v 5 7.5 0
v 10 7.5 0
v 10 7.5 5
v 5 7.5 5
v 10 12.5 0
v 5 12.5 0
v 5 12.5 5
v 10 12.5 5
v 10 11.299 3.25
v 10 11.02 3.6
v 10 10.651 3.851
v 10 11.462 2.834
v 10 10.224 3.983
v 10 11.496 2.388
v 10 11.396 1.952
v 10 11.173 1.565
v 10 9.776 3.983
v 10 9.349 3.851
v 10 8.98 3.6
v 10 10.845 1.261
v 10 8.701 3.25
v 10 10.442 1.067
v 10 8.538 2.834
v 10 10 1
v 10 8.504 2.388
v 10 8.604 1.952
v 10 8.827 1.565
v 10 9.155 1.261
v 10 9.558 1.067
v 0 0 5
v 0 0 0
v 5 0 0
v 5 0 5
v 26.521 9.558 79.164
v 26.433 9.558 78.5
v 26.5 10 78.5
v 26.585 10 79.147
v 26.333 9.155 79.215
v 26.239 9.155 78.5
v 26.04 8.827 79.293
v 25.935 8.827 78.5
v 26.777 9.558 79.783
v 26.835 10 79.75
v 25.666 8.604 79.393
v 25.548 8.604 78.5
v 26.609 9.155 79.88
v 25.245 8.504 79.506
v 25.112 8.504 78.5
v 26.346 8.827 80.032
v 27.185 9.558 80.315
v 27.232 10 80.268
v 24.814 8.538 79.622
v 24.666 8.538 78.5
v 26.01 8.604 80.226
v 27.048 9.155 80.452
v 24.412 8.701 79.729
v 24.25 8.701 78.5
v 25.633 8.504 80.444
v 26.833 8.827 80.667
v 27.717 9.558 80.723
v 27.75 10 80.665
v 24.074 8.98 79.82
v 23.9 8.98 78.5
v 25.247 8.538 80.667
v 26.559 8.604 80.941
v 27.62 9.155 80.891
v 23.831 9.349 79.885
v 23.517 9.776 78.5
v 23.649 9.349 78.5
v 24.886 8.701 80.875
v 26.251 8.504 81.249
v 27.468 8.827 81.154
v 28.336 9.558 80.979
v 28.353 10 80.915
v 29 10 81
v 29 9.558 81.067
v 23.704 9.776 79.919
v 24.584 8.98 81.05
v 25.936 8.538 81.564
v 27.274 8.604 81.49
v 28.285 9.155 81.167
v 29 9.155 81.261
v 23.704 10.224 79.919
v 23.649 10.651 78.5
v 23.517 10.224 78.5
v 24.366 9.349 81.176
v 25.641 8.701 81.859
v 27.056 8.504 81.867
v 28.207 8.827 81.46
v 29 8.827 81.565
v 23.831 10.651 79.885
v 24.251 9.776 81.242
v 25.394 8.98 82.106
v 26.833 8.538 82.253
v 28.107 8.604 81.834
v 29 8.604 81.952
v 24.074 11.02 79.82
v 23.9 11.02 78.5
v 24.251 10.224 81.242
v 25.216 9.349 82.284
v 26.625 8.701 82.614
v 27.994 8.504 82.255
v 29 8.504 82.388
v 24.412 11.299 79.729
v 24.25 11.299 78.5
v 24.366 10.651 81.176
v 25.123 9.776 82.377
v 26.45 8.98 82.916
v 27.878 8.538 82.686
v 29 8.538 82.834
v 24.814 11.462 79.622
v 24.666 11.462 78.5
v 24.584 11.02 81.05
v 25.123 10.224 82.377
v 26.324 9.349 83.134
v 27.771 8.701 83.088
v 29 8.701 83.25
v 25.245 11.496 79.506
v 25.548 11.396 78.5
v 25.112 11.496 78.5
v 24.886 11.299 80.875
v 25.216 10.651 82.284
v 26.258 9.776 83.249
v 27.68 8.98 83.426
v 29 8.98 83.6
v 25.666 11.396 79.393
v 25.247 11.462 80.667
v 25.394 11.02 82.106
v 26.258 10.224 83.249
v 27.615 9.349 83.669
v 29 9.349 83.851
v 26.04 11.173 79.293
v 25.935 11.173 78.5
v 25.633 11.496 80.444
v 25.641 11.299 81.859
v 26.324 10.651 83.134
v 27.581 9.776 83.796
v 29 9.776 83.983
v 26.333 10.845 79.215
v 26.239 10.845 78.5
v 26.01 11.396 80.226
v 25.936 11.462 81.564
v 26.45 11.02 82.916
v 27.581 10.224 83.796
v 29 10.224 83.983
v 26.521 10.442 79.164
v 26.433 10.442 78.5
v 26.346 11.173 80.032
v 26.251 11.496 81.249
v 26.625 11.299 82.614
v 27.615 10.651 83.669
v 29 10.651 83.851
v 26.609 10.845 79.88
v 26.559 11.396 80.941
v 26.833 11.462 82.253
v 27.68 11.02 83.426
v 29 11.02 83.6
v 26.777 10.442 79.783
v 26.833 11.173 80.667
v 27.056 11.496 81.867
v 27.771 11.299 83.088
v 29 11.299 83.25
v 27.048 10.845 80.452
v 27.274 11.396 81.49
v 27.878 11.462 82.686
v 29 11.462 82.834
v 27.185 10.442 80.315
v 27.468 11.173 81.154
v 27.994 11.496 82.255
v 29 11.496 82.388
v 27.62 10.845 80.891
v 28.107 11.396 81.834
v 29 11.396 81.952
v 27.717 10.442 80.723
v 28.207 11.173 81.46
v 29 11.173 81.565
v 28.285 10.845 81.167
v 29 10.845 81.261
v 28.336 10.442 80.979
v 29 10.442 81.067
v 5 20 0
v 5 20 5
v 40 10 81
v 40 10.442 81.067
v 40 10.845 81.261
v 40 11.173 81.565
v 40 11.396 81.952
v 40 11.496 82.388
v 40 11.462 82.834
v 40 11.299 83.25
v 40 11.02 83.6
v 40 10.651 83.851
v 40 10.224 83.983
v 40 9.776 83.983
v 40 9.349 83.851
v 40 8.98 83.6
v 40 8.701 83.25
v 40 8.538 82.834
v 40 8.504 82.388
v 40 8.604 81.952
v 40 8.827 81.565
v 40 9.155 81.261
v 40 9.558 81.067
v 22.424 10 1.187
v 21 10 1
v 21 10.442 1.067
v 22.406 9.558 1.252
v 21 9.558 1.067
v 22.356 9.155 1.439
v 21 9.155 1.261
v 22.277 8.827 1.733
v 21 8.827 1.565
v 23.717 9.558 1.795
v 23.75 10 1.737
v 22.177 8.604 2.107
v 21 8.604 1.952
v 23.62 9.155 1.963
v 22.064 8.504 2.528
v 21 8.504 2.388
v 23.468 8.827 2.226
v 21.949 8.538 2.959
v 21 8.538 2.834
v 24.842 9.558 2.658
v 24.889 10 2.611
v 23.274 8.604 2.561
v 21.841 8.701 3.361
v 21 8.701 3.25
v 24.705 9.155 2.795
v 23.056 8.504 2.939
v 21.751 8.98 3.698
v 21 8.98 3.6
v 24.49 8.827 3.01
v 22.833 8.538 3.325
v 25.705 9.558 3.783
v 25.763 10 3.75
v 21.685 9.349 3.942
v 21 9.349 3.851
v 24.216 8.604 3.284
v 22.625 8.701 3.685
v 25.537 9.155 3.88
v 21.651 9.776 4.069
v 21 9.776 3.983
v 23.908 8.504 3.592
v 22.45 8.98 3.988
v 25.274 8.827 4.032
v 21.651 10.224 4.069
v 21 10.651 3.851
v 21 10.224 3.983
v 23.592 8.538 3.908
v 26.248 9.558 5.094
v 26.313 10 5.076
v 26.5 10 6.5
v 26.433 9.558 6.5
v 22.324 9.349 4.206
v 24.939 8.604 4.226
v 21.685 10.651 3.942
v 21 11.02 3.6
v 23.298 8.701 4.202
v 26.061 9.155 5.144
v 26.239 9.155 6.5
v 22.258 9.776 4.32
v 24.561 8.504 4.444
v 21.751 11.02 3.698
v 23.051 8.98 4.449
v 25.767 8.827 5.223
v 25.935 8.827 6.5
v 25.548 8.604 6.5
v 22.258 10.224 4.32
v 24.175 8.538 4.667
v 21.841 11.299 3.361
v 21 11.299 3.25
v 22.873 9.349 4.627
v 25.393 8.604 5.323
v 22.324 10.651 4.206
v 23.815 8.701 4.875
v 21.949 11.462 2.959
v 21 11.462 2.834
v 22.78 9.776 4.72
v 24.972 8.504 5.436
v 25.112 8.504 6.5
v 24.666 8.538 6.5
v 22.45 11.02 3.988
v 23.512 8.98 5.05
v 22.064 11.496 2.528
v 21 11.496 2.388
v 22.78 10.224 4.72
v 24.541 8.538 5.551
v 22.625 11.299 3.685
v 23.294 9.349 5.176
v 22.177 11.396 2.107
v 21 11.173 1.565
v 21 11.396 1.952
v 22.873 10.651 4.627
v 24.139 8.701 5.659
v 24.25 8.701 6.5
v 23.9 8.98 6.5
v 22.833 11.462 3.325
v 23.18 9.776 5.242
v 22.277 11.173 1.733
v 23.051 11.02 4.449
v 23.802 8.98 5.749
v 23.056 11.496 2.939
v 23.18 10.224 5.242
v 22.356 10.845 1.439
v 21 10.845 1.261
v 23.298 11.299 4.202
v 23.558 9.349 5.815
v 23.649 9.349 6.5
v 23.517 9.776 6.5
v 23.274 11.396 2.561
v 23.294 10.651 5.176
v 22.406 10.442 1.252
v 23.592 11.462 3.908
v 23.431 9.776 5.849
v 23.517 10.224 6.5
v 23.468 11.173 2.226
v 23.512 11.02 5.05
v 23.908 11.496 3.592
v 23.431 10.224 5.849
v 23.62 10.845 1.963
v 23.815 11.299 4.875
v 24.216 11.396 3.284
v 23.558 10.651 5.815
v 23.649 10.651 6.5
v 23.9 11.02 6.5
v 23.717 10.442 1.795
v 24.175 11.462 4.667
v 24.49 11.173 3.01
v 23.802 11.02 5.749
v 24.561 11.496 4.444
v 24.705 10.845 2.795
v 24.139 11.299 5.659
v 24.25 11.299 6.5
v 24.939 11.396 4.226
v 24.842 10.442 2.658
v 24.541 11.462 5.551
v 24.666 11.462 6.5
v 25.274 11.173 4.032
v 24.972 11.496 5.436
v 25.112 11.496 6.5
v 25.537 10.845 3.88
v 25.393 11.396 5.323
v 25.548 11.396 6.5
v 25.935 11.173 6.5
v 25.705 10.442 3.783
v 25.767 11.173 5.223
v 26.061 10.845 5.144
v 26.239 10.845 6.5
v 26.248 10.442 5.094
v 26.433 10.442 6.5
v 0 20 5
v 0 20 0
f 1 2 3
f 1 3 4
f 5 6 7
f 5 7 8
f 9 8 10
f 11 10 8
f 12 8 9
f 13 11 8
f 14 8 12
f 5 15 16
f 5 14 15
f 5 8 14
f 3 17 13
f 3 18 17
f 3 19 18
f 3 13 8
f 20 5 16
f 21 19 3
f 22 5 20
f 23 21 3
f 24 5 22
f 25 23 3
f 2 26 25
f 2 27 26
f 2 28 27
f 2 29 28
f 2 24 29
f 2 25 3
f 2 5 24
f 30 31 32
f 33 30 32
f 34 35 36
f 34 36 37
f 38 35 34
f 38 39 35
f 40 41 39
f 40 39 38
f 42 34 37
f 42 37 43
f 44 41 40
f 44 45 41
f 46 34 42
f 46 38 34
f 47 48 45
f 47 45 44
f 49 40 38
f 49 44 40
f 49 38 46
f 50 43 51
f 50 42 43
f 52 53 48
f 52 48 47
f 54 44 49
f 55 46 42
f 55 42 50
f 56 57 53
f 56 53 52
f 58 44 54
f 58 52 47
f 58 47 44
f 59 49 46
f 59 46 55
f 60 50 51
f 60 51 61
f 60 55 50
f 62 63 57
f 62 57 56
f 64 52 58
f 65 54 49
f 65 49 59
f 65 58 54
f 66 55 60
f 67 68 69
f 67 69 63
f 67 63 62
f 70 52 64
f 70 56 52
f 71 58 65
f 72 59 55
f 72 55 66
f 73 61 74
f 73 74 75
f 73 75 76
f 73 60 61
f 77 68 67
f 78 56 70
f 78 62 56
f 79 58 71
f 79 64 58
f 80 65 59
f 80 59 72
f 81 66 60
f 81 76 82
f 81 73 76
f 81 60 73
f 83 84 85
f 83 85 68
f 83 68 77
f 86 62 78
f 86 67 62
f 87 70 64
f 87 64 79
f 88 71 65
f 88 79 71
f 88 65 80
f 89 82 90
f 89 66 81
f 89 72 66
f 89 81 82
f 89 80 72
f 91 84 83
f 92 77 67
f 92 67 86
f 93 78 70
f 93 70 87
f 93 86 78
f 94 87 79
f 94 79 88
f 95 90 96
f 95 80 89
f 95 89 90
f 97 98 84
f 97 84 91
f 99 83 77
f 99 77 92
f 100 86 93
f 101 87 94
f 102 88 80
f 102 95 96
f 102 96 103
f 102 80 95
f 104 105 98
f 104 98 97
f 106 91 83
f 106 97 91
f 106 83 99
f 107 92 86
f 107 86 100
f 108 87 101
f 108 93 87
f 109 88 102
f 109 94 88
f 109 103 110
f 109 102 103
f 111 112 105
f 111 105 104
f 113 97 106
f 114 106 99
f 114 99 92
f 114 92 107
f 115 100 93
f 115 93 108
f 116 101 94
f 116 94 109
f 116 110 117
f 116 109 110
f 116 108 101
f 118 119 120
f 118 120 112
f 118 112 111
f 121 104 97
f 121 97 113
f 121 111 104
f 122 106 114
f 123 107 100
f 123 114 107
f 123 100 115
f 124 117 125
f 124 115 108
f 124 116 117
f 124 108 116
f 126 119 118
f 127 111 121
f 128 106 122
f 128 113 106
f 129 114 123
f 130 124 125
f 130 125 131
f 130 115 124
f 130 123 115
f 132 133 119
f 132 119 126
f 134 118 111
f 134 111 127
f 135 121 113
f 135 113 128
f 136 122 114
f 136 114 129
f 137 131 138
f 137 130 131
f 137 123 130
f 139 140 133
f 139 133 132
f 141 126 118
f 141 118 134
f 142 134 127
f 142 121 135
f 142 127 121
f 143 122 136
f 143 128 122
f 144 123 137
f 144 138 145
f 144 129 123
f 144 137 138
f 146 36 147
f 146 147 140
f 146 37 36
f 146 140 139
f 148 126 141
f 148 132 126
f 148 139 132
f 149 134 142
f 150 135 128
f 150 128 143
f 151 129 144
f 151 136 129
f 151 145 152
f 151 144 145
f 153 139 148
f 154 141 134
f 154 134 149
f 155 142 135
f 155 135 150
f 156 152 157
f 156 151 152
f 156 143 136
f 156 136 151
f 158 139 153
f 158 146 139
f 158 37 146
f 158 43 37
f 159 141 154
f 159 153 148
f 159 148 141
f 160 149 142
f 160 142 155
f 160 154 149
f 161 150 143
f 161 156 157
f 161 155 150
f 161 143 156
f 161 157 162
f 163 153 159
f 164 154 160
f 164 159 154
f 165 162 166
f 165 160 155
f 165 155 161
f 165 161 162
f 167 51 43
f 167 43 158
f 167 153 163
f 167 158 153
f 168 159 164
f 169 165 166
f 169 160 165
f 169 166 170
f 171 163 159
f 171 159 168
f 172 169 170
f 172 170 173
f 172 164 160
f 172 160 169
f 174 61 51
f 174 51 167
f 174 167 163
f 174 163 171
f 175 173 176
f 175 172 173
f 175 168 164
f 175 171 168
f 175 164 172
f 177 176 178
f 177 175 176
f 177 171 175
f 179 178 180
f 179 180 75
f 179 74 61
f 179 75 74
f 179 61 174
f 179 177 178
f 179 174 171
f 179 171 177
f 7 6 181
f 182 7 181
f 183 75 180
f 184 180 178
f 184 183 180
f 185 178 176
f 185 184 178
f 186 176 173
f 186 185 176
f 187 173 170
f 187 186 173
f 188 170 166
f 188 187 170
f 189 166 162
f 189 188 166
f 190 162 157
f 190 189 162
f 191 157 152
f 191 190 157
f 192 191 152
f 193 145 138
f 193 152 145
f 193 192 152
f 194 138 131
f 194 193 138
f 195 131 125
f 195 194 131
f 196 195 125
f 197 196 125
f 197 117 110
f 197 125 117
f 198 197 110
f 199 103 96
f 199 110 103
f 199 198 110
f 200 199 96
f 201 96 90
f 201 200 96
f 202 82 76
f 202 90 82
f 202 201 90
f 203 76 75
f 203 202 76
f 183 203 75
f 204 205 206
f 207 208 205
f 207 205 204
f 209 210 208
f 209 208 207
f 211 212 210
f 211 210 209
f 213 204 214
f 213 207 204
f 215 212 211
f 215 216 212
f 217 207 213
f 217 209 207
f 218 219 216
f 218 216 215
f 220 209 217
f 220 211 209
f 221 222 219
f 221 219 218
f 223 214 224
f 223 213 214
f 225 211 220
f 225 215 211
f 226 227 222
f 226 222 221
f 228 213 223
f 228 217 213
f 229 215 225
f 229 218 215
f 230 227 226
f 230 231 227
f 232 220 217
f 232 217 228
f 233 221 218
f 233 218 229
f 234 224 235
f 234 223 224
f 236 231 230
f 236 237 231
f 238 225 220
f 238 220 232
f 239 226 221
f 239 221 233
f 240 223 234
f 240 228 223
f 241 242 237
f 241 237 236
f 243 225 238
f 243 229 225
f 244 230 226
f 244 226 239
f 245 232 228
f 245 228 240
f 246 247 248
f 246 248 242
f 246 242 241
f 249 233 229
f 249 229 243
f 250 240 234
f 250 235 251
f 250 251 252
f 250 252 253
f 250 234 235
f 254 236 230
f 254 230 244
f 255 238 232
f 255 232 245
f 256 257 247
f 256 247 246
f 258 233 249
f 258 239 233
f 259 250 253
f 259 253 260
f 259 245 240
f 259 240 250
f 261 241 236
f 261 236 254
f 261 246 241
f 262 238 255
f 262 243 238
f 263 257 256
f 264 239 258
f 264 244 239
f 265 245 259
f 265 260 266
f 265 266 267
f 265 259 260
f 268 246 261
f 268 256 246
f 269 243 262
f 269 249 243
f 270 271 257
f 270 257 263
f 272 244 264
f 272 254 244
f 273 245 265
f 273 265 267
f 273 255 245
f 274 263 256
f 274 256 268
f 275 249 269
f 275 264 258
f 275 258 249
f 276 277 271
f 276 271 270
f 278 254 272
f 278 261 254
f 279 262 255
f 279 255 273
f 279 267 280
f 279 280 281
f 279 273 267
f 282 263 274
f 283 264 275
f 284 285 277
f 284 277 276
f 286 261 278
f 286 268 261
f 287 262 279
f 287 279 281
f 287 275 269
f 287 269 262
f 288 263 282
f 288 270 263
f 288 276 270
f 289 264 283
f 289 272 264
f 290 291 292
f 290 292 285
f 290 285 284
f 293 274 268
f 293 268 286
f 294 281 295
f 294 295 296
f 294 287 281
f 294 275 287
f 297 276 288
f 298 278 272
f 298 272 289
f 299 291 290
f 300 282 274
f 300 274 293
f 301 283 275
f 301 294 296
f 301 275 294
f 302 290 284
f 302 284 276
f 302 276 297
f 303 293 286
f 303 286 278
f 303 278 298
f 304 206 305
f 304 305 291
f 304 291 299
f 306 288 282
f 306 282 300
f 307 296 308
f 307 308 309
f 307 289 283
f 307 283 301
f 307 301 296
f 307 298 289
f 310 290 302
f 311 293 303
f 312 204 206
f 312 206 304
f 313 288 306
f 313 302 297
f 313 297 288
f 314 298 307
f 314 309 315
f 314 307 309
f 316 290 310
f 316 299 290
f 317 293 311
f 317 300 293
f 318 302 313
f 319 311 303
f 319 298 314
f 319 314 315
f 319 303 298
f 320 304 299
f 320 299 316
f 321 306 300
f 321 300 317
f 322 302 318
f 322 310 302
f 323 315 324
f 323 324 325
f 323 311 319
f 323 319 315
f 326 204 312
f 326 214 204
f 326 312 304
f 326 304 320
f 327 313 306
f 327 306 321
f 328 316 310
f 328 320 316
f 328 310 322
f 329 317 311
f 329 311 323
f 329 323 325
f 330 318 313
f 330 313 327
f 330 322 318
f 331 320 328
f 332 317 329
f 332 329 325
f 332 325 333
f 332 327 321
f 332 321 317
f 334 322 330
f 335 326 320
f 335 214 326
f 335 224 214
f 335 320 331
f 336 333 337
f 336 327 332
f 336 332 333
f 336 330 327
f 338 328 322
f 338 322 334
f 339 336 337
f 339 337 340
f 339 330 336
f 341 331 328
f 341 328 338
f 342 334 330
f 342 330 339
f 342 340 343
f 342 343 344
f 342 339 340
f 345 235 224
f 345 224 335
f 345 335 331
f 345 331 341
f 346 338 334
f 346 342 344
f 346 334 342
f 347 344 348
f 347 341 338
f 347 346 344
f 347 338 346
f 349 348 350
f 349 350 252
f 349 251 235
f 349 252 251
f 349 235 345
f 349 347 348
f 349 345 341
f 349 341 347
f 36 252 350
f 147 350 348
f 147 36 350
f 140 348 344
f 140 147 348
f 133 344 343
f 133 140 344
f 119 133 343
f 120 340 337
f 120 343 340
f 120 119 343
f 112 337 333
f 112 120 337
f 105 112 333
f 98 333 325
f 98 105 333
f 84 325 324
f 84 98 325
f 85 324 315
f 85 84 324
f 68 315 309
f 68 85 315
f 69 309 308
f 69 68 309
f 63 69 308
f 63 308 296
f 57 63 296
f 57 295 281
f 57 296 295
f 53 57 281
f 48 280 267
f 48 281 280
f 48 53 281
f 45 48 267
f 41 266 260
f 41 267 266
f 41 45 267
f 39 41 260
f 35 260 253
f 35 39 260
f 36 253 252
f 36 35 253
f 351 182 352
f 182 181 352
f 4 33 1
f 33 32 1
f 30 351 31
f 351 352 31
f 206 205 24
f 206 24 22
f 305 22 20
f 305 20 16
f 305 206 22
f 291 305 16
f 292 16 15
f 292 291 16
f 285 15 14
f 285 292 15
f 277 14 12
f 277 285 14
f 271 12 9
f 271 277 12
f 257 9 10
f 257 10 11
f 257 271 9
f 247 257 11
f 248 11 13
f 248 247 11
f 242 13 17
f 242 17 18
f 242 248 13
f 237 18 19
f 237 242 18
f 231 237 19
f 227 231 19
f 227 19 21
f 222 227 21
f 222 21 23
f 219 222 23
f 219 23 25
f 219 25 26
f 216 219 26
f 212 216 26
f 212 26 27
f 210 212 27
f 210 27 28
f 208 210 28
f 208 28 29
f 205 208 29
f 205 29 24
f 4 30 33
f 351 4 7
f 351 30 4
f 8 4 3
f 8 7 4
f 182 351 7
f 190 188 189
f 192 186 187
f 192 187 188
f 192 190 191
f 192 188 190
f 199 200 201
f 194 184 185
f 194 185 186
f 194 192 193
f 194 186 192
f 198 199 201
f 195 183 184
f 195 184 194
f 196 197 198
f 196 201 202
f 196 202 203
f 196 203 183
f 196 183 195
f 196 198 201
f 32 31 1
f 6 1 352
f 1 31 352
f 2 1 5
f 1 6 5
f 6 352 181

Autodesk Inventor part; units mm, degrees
ref_plane "YZ Plane" through (0, 0, 0) normal (1, 0, 0) x (0, 1, 0)
ref_plane "XY Plane" through (0, 0, 0) normal (0, 0, 1) x (1, 0, 0)
sketch "Sketch1" plane through (0, 0, 0) normal (0, 0, 1) x (1, 0, 0)
  line L0 (0, 0) -> (5, 0)
  line L1 (5, 0) -> (5, 20)
  line L2 (5, 20) -> (0, 20)
  line L3 (0, 20) -> (0, 0)
  line L4 (5, 12.5) -> (10, 12.5)
  line L5 (10, 12.5) -> (10, 7.5)
  line L6 (10, 7.5) -> (5, 7.5)
  line L7 (5, 7.5) -> (5, 12.5)
  line L8 (0, 10) -> (28.6549, 10) construction
  dimension "d0" = 5
  dimension "d1" = 20
  dimension "d2" = 5
  dimension "d3" = 5
  dimension "d4" = 2.5
extrude "Extrusion1" add sketch "Sketch1" along normal blind 5
ref_plane "Work Plane2" through (0, 10, 0) normal (0, 1, 0) x (-1, 0, 0)
sketch "Sketch2" plane through (0, 10, 0) normal (0, 1, 0) x (-1, 0, 0)
  line L0 (-10, 0) -> (-10, 5) projected
  line L1 (-10, 2.5) -> (-21, 2.5)
  line L2 (-25, 6.5) -> (-25, 78.5)
  line L3 (-29, 82.5) -> (-40, 82.5)
  arc A0 (-25, 6.5) -> (-21, 2.5) centre (-21, 6.5) ccw
  arc A1 (-25, 78.5) -> (-29, 82.5) centre (-29, 78.5) ccw
  point P0 (0, 0)
  dimension "d11" = 8
  dimension "d12" = 8
  dimension "d13" = 15
  dimension "d14" = 80
  dimension "d16" = 15
sketch "Sketch3" plane through (10, 7.5, 0) normal (1, 0, 0) x (0, 0, -1)
  circle A0 centre (-2.5, 2.5) radius 1.5
  line L0 (0, 5) -> (-5, 5) projected
  line L1 (0, 0) -> (0, 5) projected
  point P0 (0, -7.5)
  dimension "d17" = 3
  dimension "d18" = 2.5
  dimension "d19" = 2.5
sweep "Sweep1" add profiles "Sketch3" path "Sketch2" path curves L1 A0 L2 A1 L3
properties part number "gancho"
